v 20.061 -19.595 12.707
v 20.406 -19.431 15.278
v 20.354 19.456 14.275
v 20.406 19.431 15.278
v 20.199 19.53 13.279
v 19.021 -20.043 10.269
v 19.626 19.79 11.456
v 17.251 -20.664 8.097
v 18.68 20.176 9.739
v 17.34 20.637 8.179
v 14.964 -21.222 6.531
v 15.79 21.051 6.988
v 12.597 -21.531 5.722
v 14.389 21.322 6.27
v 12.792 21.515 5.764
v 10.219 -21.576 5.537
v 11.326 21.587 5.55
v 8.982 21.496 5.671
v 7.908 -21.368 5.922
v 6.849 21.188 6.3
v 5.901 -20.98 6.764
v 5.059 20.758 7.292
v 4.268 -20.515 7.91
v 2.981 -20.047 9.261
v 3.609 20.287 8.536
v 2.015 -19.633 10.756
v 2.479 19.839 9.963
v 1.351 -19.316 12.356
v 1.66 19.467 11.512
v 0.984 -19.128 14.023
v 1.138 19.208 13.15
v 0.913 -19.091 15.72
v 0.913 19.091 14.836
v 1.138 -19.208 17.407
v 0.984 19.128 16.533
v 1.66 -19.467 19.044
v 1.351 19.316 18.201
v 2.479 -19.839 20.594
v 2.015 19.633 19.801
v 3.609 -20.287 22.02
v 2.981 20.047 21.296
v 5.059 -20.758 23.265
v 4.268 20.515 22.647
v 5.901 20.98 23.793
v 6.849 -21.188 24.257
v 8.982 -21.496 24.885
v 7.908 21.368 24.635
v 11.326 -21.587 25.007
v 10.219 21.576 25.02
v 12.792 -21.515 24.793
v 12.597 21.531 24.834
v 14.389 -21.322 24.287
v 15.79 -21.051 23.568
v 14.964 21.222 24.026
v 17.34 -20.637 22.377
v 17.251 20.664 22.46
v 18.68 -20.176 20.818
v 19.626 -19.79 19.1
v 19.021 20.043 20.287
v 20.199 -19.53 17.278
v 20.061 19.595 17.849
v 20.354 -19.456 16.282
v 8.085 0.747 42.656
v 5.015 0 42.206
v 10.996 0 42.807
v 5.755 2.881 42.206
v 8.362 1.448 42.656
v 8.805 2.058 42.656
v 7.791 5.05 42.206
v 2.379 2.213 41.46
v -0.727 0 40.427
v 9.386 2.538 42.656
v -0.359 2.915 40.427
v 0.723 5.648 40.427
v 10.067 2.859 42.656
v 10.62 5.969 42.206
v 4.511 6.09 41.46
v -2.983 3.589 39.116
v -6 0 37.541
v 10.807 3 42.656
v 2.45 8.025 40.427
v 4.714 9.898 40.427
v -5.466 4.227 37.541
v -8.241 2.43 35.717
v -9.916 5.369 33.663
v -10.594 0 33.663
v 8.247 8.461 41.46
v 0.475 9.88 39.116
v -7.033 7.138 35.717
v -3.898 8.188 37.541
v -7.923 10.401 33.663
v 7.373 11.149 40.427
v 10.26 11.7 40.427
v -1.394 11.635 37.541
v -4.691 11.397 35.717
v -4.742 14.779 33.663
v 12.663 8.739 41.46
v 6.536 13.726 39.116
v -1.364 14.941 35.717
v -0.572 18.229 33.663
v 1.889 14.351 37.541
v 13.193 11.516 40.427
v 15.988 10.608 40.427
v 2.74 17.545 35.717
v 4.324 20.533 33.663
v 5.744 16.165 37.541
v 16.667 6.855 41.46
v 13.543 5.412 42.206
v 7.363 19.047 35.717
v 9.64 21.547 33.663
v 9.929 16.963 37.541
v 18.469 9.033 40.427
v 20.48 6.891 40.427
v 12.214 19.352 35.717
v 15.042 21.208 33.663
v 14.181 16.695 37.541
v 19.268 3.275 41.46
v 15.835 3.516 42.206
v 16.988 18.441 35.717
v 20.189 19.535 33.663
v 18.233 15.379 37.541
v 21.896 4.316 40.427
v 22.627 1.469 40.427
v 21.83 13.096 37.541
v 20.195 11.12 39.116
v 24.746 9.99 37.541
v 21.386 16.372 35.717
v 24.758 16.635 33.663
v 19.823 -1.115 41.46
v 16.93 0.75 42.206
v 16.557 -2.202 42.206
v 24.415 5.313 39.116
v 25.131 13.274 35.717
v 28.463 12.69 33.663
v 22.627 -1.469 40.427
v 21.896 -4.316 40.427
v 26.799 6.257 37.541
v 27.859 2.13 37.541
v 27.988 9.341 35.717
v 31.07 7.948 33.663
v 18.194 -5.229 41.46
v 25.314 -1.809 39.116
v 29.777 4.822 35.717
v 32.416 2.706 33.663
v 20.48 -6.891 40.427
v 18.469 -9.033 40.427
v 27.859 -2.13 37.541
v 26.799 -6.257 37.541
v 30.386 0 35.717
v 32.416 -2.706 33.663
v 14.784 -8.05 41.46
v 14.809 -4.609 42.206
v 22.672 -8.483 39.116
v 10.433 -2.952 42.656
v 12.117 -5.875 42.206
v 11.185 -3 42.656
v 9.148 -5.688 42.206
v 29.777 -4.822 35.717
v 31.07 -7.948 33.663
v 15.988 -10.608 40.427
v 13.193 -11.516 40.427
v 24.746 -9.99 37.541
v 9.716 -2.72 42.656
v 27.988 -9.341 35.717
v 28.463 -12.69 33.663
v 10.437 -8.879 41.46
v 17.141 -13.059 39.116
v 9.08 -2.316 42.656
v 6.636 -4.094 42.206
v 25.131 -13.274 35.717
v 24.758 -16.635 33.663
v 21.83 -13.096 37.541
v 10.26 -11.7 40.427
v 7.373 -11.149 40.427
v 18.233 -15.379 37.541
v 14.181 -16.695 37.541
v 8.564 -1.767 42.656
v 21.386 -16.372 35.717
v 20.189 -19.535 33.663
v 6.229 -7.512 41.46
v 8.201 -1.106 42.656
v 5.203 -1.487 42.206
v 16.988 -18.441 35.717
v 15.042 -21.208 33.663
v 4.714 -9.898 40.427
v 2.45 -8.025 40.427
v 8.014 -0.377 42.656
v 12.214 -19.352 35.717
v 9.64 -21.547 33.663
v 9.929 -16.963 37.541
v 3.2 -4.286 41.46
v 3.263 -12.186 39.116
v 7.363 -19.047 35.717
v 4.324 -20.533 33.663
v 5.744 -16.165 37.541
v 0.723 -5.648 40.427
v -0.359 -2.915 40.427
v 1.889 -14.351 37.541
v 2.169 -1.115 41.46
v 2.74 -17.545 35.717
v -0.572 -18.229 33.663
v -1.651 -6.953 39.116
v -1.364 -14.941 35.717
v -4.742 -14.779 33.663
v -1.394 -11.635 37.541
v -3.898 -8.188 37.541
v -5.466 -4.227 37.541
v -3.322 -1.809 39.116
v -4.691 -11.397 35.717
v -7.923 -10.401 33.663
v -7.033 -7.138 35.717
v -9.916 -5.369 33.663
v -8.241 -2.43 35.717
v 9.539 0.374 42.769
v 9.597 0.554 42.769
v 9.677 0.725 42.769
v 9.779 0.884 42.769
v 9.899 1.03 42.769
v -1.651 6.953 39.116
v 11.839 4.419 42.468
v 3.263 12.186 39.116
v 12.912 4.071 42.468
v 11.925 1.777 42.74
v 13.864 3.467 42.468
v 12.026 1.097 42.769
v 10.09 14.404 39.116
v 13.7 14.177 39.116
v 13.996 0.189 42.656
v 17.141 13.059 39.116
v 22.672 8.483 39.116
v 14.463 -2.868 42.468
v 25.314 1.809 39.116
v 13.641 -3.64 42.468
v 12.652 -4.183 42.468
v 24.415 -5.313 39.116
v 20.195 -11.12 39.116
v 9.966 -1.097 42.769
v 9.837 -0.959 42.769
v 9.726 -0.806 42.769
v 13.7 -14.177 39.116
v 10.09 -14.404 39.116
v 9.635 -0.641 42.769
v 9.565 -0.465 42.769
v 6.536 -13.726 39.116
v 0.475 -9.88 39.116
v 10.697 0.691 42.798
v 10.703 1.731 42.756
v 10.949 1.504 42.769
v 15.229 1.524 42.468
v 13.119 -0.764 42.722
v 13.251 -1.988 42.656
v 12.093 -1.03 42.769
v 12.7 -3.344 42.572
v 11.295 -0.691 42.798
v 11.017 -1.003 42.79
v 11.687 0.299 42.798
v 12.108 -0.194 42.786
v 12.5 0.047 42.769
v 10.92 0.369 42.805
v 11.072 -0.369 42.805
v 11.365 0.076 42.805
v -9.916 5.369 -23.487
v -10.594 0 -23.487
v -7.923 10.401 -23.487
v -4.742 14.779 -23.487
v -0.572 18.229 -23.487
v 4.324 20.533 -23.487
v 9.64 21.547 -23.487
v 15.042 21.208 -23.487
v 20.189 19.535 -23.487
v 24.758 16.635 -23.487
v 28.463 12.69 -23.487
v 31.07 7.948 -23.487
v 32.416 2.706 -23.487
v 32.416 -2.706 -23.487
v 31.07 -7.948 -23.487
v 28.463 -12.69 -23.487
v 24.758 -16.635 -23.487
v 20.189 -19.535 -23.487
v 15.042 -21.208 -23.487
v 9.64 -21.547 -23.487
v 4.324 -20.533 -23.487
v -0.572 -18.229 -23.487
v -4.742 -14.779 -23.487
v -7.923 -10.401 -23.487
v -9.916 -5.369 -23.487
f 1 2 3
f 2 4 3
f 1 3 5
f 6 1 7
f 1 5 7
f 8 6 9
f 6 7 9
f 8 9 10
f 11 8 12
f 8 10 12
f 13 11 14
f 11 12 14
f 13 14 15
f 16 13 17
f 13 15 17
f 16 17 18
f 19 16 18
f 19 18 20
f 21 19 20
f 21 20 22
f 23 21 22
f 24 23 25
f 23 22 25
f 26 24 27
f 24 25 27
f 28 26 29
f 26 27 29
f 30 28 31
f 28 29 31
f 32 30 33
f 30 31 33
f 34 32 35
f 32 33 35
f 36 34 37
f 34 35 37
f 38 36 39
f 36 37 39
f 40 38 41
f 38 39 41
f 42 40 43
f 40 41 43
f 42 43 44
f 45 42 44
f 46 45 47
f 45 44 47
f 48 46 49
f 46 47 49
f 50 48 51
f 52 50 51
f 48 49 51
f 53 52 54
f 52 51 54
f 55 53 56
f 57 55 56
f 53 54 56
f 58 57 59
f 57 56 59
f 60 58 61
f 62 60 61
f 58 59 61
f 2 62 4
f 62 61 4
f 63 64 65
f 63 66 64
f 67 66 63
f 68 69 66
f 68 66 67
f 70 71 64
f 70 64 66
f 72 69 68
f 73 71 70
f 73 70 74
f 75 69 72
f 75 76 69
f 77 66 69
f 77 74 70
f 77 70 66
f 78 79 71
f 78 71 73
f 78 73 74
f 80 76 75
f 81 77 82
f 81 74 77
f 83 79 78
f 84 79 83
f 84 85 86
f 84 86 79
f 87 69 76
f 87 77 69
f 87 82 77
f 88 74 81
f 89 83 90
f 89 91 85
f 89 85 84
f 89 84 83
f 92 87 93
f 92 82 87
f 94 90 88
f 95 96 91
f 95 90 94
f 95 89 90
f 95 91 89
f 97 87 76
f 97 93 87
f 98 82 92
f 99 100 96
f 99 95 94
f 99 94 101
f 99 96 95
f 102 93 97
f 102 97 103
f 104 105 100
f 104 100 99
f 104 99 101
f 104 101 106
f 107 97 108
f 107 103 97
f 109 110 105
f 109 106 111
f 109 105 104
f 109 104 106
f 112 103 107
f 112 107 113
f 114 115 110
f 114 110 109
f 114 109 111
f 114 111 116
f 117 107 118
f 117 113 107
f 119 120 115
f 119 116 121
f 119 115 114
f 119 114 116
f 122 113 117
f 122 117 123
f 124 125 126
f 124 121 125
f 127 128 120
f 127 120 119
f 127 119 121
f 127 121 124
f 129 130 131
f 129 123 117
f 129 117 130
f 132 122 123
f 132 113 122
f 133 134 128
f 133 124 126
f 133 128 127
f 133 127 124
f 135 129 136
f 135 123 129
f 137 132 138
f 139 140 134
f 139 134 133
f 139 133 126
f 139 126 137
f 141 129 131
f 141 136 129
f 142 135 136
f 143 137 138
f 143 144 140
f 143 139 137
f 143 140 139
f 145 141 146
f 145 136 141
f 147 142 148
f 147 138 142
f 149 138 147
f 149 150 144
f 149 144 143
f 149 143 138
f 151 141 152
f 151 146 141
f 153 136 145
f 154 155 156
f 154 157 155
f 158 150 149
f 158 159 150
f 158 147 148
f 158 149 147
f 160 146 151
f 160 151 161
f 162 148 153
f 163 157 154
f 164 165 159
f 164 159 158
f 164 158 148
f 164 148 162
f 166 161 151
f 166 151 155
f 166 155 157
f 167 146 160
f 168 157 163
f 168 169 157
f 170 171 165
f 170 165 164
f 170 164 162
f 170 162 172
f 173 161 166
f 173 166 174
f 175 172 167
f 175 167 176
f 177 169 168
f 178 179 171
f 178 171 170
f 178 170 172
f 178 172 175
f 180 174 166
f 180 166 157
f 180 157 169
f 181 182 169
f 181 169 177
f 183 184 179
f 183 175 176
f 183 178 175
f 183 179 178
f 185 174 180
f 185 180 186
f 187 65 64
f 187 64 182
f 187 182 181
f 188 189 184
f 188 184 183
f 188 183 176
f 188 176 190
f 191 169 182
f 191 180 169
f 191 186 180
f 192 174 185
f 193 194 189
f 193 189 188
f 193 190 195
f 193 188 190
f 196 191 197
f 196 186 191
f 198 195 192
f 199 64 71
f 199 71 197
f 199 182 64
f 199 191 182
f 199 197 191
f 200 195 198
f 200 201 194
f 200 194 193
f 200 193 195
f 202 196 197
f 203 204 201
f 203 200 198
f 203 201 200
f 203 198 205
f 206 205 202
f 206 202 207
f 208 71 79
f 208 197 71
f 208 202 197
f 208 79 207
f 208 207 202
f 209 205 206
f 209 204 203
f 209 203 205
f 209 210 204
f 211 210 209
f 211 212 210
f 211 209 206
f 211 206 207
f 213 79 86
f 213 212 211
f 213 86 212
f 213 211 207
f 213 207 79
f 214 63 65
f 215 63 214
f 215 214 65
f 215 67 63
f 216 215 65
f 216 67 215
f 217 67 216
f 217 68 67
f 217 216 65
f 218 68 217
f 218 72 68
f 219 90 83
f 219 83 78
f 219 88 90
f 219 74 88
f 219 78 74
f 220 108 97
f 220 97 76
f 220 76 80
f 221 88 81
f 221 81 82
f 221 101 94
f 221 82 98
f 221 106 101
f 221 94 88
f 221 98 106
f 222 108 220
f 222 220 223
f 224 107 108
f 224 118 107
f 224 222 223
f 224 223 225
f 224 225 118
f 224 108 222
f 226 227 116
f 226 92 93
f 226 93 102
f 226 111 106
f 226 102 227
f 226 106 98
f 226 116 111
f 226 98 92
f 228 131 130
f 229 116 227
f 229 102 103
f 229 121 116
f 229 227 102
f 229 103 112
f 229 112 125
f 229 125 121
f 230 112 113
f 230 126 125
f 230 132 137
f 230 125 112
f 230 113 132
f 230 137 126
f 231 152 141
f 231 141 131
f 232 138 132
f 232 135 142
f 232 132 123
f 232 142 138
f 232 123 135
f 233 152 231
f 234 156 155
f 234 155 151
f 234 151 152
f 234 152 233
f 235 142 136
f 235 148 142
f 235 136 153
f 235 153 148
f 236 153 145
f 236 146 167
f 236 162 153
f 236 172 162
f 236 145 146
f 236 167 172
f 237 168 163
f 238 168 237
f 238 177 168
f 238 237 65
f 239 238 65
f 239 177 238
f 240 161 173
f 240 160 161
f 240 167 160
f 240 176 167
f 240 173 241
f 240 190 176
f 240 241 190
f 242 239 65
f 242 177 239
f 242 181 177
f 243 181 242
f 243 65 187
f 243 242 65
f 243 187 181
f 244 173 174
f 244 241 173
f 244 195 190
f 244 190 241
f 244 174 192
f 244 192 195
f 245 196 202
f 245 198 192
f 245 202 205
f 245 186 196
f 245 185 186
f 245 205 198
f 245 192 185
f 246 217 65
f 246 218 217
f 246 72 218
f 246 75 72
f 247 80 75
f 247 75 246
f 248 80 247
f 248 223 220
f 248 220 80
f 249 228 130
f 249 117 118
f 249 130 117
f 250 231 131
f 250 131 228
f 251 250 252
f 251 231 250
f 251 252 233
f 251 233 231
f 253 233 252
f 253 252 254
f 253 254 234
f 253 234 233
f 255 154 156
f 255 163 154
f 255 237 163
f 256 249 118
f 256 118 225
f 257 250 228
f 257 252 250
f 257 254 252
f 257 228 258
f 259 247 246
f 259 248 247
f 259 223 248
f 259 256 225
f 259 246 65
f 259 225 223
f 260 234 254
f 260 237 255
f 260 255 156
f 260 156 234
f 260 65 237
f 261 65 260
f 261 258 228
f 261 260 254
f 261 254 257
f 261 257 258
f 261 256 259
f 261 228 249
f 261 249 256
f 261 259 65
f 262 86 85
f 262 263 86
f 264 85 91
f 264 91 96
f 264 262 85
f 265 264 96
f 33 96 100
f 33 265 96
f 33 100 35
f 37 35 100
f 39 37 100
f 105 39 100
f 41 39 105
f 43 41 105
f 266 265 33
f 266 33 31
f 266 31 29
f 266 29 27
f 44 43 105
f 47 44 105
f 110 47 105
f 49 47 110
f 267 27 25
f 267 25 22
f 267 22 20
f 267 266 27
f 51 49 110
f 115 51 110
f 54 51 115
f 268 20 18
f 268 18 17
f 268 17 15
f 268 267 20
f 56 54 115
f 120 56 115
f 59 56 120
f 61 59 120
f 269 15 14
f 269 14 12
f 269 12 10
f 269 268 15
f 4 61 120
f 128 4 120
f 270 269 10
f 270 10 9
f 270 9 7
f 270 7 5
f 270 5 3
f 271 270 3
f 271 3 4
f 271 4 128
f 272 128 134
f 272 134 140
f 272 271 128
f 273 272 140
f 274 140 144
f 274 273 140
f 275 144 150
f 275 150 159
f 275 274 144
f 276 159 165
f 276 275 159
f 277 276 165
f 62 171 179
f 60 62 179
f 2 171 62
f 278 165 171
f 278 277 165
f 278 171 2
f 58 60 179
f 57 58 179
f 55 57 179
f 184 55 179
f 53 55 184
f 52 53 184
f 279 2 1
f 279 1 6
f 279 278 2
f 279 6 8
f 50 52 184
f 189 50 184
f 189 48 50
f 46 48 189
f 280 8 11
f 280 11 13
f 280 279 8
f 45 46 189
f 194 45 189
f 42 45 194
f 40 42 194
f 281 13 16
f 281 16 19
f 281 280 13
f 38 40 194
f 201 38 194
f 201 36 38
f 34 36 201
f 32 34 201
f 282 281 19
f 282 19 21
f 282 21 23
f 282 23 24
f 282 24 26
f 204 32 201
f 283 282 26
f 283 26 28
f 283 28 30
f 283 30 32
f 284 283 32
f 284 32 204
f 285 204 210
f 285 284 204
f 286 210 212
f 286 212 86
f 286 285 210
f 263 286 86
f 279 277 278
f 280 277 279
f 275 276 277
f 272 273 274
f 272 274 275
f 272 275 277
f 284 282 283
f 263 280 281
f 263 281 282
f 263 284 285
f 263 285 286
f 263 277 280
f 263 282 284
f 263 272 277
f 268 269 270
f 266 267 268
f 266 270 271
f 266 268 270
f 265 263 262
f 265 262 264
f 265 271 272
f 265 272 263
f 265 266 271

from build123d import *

# Parameters (mm, degrees)
F2_R      = 9.751517
F3_DEPTH  = 21.591
F3_FACE_R = 9.751517
F4_DEPTH  = 21.591


with BuildPart() as f1:
    # F0 (on Front) → F1 (revolve)
    with BuildSketch(Plane.XZ):
        with BuildLine():
            Line((-10.593969, 33.663088), (-10.593969, -23.486912))
            Line((-10.593969, -23.486912), (10.996031, -23.486912))
            Line((10.996031, -23.486912), (10.996031, 42.807088))
            ThreePointArc((10.996031, 42.807088), (-0.727246, 40.426852), (-10.593969, 33.663088))
        make_face()
    revolve(axis=Axis((10.996031, 0, 9.660088), (0, 0, -1)))

    # F2 (on Front) → F3 (cut, through all)
    with BuildSketch(Plane.XZ):
        with Locations((10.654598, 15.278292)):
            Circle(F2_R)
    extrude(amount=-F3_DEPTH, mode=Mode.SUBTRACT)

    # F3_face (on face) → F4 (cut, through all)
    with BuildSketch(Plane(origin=(10.654598, 0, 15.278292), x_dir=(1, 0, 0), z_dir=(0, 1, 0))):
        Circle(F3_FACE_R)
    extrude(amount=-F4_DEPTH, mode=Mode.SUBTRACT)


solid = f1.part
